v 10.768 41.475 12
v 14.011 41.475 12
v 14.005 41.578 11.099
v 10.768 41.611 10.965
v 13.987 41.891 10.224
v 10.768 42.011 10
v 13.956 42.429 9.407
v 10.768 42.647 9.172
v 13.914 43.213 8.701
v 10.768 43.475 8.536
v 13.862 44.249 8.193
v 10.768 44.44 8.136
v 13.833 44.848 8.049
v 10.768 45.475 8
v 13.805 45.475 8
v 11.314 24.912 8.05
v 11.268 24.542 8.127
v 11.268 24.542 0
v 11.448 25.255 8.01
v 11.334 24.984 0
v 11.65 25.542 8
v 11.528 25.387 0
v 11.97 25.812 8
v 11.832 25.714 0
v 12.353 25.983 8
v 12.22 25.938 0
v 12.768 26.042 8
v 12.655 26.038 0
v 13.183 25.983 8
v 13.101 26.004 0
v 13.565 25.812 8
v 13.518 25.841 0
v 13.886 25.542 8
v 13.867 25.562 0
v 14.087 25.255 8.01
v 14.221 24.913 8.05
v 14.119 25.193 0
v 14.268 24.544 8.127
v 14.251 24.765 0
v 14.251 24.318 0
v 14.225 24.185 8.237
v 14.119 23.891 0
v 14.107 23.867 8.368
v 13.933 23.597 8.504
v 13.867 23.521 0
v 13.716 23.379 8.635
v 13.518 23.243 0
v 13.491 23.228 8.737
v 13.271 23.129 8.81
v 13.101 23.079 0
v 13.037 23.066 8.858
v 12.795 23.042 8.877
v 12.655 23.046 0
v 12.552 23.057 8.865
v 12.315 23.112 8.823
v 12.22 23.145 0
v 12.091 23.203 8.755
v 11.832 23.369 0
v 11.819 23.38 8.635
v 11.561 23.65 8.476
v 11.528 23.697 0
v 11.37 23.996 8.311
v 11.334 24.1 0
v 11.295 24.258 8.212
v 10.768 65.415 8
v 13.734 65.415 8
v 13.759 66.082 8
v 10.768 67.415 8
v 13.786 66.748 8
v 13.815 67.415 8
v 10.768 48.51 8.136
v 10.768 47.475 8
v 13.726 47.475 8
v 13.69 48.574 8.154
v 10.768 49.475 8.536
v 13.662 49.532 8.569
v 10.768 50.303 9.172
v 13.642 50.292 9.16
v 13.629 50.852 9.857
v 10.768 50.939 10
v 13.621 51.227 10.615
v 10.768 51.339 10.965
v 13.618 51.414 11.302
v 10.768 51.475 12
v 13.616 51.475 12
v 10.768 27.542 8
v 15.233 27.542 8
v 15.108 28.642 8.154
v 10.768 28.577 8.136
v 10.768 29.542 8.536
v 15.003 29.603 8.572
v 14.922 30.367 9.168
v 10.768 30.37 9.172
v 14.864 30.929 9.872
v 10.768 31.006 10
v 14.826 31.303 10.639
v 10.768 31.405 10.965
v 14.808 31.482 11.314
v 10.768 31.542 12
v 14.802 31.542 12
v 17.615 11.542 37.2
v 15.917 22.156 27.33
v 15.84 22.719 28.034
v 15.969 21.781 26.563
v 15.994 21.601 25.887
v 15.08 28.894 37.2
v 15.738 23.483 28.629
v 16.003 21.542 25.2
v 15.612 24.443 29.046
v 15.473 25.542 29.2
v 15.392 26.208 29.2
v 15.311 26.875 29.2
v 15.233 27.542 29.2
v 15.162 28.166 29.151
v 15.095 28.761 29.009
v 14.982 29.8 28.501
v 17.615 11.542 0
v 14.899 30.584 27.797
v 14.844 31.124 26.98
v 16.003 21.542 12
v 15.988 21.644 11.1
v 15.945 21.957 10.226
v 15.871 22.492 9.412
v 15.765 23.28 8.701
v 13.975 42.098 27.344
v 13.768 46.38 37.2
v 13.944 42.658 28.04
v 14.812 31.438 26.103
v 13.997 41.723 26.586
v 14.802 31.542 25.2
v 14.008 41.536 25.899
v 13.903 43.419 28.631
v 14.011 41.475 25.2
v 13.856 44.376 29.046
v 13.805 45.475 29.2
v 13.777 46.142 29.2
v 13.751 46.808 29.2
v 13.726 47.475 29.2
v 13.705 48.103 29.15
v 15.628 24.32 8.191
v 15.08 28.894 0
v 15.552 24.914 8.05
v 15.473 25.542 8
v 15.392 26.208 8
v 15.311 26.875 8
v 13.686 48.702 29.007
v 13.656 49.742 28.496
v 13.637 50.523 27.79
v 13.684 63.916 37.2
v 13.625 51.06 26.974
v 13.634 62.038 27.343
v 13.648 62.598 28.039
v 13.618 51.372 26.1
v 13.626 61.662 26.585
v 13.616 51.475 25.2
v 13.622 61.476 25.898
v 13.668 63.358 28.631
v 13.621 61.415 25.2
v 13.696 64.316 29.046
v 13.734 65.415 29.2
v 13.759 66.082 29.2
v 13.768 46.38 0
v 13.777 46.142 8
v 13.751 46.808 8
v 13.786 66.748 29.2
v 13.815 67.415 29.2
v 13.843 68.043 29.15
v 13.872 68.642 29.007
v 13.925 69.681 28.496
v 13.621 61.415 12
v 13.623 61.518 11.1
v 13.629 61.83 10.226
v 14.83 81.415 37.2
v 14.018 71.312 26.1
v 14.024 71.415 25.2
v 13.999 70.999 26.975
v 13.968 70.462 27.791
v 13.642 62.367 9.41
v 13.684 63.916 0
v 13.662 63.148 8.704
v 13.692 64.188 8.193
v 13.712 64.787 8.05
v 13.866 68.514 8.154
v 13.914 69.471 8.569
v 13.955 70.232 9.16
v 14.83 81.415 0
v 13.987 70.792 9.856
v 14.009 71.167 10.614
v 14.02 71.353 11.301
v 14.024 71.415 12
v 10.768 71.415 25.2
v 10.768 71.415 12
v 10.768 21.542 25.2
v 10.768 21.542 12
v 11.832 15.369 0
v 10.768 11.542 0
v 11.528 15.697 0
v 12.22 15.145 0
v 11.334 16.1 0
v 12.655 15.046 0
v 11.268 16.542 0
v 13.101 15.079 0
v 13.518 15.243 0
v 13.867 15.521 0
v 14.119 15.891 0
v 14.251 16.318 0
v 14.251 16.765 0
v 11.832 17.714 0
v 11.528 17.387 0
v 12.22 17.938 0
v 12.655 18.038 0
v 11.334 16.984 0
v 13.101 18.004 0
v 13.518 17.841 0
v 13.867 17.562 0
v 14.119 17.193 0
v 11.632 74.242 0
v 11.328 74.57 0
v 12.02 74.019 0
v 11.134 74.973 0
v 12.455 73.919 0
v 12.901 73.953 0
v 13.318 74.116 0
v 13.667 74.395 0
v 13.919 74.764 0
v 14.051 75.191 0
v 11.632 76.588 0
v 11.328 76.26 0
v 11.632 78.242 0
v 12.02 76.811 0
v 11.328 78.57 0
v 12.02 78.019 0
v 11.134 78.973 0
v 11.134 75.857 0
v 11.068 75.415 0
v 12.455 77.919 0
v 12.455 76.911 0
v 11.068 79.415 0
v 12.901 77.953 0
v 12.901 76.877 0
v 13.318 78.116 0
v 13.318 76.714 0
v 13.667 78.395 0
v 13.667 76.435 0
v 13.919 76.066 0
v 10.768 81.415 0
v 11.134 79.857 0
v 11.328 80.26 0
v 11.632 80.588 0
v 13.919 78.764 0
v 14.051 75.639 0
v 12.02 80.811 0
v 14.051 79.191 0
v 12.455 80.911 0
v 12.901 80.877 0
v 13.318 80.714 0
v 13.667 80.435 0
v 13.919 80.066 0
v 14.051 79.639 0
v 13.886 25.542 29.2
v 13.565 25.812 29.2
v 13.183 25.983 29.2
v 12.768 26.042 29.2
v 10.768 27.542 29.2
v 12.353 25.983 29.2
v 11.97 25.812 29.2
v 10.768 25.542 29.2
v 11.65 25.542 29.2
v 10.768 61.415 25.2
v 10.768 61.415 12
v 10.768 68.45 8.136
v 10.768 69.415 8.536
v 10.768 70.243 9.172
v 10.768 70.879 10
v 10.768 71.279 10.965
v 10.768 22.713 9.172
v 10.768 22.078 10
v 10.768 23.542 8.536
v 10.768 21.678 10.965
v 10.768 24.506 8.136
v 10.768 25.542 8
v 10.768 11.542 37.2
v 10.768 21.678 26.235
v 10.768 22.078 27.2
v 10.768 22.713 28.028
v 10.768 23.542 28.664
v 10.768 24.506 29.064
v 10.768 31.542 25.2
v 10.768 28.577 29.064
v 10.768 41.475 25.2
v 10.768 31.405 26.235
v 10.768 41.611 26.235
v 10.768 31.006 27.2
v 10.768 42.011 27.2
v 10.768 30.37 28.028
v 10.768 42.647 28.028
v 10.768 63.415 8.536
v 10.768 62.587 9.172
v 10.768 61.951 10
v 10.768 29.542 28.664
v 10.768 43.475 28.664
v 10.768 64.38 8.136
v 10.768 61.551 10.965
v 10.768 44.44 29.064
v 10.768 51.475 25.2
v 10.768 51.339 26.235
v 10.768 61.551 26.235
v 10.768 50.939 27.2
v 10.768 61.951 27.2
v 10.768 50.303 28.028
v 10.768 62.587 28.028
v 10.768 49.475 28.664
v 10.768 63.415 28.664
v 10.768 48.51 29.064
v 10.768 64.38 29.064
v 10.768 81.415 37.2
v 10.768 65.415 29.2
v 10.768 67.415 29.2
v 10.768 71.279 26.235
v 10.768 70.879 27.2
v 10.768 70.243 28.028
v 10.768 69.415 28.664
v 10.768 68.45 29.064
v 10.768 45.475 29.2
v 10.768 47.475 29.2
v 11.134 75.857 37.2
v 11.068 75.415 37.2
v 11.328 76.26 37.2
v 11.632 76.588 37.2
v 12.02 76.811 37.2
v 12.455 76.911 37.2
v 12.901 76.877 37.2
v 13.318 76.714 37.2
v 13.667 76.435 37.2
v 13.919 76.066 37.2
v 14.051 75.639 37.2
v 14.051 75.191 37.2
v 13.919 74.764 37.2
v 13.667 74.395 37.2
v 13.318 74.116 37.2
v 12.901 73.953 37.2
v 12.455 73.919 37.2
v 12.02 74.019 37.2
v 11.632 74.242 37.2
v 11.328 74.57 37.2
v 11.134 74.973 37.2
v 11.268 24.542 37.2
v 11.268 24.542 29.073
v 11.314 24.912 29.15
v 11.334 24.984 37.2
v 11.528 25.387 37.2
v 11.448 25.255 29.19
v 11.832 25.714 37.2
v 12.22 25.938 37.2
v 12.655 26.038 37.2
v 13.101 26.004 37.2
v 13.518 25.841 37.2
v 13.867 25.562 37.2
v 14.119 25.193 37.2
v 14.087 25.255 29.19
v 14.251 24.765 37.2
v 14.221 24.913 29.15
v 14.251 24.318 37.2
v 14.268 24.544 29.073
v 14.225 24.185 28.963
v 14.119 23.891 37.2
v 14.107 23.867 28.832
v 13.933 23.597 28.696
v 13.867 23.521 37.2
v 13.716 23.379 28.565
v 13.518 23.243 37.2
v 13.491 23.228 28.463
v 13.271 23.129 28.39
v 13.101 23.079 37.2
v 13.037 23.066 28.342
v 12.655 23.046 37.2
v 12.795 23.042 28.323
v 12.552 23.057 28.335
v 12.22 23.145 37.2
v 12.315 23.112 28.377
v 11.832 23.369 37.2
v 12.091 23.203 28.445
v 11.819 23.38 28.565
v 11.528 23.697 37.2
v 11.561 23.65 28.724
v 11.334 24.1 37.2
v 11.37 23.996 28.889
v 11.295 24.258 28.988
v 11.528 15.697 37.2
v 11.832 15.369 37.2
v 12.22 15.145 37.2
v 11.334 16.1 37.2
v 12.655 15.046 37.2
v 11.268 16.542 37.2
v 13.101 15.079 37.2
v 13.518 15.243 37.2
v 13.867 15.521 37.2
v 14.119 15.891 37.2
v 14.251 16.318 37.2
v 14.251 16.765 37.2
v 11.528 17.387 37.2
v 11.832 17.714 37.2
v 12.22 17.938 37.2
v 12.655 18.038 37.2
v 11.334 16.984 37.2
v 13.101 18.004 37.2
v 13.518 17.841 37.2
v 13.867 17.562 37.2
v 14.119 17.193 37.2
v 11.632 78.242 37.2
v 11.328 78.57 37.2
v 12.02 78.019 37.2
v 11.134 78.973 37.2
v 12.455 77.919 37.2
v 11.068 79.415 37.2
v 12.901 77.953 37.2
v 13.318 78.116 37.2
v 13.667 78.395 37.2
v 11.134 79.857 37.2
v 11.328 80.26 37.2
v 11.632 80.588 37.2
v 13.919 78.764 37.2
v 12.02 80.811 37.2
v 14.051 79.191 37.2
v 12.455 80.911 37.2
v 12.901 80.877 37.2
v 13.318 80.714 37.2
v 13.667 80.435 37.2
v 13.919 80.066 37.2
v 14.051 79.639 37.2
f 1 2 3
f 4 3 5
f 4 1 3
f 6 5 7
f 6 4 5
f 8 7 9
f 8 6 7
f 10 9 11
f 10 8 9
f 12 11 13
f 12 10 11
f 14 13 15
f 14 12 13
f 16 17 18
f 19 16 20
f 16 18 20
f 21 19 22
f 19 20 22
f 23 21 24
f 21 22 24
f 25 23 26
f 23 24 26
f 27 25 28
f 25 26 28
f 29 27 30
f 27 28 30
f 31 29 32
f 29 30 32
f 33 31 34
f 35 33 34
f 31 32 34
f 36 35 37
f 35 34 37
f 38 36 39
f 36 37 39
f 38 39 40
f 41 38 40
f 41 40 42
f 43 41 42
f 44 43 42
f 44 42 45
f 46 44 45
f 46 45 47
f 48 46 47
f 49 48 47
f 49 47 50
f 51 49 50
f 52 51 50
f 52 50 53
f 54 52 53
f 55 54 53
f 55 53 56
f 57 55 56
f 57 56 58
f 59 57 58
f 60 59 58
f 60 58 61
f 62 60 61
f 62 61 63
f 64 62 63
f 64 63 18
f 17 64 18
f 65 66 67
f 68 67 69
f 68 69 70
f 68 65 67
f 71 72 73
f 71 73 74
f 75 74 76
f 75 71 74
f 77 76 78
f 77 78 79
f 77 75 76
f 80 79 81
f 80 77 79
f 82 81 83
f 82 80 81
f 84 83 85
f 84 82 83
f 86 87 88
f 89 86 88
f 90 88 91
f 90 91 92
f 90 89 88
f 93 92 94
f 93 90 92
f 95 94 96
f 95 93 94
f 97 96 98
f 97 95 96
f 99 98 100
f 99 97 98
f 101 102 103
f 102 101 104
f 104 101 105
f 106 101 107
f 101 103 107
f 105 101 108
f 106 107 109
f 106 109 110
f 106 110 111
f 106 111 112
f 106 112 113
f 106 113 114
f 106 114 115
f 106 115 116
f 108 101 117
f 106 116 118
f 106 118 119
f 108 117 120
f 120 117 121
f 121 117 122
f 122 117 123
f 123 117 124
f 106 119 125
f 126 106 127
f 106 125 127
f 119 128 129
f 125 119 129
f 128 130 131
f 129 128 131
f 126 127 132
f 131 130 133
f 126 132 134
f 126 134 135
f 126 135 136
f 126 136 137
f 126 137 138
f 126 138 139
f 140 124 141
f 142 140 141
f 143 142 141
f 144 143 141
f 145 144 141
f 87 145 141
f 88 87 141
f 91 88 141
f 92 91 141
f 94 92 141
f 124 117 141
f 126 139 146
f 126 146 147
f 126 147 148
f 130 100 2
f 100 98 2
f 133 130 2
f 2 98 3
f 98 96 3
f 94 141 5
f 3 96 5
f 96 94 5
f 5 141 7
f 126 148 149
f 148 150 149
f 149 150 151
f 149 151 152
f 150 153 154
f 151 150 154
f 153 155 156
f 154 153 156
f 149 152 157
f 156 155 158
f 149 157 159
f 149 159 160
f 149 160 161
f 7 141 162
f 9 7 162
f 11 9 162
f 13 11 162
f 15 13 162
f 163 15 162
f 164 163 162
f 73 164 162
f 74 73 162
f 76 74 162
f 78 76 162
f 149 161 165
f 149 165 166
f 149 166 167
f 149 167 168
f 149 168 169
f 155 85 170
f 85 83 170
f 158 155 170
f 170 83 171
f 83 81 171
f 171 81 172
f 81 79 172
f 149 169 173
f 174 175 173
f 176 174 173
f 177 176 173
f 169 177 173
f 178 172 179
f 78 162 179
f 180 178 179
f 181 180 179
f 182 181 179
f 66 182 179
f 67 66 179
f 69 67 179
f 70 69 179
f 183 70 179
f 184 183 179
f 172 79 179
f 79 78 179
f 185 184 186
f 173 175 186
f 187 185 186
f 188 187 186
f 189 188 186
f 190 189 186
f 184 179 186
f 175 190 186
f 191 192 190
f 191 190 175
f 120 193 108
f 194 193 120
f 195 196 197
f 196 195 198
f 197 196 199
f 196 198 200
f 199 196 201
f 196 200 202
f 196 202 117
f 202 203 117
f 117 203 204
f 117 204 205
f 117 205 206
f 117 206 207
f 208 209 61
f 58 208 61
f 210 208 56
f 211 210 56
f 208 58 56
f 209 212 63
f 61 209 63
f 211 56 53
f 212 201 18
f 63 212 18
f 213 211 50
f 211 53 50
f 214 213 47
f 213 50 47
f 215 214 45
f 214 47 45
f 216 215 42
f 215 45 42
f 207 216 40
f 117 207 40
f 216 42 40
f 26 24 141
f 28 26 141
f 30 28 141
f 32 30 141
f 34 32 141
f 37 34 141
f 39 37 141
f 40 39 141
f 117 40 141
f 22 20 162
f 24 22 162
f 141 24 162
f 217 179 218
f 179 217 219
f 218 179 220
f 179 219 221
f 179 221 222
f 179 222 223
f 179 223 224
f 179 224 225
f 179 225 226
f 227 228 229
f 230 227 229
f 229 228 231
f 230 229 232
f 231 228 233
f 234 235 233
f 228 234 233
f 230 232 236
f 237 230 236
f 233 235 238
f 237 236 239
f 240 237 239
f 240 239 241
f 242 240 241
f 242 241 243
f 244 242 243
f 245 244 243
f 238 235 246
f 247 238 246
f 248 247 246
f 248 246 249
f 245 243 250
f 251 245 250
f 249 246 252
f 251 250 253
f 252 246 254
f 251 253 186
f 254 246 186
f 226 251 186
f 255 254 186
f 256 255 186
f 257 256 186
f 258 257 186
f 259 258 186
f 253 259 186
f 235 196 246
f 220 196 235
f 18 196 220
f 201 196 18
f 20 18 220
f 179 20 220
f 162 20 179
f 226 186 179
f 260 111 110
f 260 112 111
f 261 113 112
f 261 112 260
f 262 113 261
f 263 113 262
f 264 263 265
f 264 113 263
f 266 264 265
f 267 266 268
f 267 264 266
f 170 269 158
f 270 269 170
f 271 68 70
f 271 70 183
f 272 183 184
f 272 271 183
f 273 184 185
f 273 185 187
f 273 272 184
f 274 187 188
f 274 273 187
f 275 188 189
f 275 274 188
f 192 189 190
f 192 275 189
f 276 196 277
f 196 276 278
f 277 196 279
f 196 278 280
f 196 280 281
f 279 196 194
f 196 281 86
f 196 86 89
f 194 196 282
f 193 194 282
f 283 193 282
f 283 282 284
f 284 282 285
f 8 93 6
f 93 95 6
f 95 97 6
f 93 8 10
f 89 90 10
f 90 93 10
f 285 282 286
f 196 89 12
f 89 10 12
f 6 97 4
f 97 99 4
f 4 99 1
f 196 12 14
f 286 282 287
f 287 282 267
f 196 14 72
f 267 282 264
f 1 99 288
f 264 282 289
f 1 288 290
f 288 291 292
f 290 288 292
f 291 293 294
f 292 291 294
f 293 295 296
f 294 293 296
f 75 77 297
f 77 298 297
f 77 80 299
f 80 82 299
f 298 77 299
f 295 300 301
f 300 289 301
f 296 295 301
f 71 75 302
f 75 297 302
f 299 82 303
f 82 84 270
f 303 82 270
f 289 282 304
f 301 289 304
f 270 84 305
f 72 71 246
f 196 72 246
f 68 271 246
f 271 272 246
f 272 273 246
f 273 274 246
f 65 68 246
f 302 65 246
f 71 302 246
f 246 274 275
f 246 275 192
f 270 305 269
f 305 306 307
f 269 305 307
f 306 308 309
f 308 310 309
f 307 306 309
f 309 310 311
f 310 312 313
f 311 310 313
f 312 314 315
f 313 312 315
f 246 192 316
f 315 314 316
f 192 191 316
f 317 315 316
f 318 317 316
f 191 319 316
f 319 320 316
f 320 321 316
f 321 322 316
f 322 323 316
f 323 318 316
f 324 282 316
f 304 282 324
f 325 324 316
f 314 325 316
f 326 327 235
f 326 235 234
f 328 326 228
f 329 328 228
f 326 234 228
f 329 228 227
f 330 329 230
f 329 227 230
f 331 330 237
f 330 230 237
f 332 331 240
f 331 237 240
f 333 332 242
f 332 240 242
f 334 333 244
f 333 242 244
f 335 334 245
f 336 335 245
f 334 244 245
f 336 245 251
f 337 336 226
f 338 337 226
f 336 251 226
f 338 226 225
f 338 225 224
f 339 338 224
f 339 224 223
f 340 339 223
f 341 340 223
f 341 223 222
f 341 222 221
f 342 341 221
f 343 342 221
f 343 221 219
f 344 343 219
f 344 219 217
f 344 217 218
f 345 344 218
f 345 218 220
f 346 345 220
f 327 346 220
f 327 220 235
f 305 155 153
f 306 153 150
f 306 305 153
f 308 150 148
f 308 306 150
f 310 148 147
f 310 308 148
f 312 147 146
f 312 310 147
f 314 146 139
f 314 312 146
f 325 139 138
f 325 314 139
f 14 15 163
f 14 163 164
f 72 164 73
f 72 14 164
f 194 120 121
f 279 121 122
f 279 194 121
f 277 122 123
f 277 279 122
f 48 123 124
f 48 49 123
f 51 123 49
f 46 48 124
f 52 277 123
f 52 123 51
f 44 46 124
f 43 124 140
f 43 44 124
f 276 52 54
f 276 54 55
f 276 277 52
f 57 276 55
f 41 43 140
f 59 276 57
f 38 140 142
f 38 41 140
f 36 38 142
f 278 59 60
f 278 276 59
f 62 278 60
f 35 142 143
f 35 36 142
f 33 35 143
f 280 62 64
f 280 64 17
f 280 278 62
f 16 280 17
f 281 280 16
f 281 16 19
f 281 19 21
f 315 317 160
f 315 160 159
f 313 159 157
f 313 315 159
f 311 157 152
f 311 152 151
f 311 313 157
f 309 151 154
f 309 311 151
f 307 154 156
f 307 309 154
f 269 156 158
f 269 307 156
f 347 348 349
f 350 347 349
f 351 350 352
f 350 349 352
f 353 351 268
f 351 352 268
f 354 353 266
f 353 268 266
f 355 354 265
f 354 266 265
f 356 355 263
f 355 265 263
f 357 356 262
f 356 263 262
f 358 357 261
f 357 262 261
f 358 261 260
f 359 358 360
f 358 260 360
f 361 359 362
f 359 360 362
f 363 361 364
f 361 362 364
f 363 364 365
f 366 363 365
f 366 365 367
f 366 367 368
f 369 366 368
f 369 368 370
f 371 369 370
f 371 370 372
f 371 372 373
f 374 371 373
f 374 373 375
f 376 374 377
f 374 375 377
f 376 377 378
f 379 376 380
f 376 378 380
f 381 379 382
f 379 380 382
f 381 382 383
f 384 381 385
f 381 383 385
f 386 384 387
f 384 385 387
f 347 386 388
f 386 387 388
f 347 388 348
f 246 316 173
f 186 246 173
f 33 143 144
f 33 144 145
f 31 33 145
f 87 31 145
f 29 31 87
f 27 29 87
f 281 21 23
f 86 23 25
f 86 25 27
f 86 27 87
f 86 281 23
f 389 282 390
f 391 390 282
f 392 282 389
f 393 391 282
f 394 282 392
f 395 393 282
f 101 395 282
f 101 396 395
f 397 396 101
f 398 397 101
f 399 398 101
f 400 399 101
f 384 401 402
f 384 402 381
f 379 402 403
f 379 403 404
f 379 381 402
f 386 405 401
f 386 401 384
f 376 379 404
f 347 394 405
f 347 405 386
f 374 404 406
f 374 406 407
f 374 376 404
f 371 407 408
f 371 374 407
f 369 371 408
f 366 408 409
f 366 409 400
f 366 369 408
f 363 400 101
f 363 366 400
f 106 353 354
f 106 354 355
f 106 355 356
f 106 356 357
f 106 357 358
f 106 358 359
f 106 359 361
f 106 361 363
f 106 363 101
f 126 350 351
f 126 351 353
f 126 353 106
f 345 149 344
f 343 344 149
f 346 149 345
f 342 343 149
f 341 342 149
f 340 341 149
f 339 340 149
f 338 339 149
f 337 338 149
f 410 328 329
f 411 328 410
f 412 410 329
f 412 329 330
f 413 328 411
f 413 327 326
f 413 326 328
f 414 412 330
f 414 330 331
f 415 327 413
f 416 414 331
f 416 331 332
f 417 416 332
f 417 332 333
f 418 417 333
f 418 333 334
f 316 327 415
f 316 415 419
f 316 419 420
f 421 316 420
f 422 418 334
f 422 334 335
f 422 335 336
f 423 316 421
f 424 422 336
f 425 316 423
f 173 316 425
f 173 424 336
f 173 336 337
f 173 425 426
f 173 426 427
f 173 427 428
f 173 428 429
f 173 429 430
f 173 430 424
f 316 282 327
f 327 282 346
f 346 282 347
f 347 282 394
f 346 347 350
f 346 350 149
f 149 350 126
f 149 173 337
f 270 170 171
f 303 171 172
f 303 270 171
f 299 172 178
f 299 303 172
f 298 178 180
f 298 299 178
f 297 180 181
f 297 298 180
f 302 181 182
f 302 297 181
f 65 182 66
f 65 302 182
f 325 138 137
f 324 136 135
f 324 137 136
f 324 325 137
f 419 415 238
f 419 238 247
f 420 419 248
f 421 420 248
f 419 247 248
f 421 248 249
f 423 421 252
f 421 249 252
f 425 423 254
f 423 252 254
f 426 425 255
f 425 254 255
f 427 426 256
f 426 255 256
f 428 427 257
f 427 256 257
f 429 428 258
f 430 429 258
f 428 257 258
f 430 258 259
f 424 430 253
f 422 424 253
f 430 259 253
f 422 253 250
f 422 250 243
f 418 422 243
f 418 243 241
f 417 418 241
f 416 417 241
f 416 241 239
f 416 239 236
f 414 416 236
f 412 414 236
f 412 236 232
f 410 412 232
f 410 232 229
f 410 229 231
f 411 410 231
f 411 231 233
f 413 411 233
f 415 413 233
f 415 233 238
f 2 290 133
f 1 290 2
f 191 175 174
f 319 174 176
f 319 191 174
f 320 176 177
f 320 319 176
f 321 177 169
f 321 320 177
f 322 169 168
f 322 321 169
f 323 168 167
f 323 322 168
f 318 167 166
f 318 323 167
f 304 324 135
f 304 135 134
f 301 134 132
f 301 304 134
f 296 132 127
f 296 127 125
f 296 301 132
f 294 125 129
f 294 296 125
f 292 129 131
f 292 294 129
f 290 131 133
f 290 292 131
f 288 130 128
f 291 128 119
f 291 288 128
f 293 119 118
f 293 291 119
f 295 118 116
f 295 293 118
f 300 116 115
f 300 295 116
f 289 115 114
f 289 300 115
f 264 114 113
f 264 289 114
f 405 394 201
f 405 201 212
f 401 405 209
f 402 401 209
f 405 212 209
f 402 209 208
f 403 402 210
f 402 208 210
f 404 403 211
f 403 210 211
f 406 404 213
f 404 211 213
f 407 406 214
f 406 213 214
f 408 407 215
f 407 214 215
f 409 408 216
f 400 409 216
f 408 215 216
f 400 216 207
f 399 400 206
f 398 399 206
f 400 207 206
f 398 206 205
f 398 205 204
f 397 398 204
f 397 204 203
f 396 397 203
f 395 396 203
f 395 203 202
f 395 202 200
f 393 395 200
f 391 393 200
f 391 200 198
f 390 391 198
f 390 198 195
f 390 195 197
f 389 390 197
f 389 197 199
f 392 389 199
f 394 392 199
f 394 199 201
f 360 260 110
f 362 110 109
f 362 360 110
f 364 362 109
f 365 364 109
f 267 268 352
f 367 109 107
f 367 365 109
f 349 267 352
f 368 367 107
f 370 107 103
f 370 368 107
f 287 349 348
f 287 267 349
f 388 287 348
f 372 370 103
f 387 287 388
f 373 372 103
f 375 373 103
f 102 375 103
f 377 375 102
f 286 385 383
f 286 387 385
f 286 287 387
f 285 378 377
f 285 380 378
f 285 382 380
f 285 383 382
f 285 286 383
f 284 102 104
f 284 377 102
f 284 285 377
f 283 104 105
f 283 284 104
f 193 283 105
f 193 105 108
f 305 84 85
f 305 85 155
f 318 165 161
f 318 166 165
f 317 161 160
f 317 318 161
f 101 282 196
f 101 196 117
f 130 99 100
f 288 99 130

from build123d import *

# Parameters (mm, degrees)
RESSALTO_EXTRUS_O1_DEPTH = 37.2
FILETE3_R                = 10
FILETE4_R                = 10
ESBO_O3_W                = 64.493903811
ESBO_O3_H                = 22.028162523
CORTE_EXTRUS_O2_DEPTH    = 126.622328301
ESBO_O4_W                = 56.697594262
ESBO_O4_H                = 123.119514717
CORTE_EXTRUS_O6_DEPTH    = 126.622328159
ESBO_O7_W                = 25.761955102
ESBO_O7_H                = 34.830585193
CORTE_EXTRUS_O7_DEPTH    = 125.245881598
CORTE_EXTRUS_O8_DEPTH    = 90.772656751
ESBO_O9_R                = 1.5
CORTE_EXTRUS_O9_DEPTH    = 92.227960203


with BuildPart() as part:
    # Esboço1 → Ressalto-extrusão1 (new body)
    with BuildSketch(Plane.XY):
        with BuildLine():
            ThreePointArc((-10, 0), (0, -10), (10, 0))
            Line((10, 0), (20, 0))
            ThreePointArc((20, 0), (14.071698091, 40.495175194), (14.829943665, 81.414963086))
            ThreePointArc((14.829943665, 81.414963086), (11.193742071, 116.066691762), (-16.576524471, 95.024435265))
            Line((-16.576524471, 95.024435265), (-16.487894969, 94.437265709))
            Line((-16.487894969, 94.437265709), (-16.369382775, 93.652123615))
            ThreePointArc((-16.369382775, 93.652123615), (-13.756795166, 46.654405302), (-20, 0))
            Line((-20, 0), (-10, 0))
        make_face()
    extrude(amount=RESSALTO_EXTRUS_O1_DEPTH)

    # Filete3
    # the kernel refuses this fillet: 10 mm, written as the material it takes off along each edge
    with BuildSketch(Plane(origin=(20, 0, -29.463728433), x_dir=(-0.20232831186330175, 0.9793177493635794, 0), z_dir=(0, 0, 1))) as filete3_piece_1:
        with BuildLine():
            CenterArc((12.021201201, 9.997221658), FILETE3_R, 181.169168083, 87.480189)
            Line((2.023283119, 9.793177494), (1.823324757, 9.78909661))
            ThreePointArc((1.823324757, 9.78909661), (0.815778009, 4.937054409), (-0.19586355, 0.040465662))
            Line((-0.19586355, 0.040465662), (0.004714197, -0.199944433))
            ThreePointArc((0.004714197, -0.199944433), (5.892745687, -0.130541448), (11.780777177, -0.199944433))
            Line((11.780777177, -0.199944433), (11.785491373, 0))
        make_face()
    extrude(amount=96.127456867, mode=Mode.SUBTRACT)
    with BuildSketch(Plane(origin=(-20, 0, -29.463728433), x_dir=(1, 0, 0), z_dir=(0, 0, 1))) as filete3_piece_2:
        with BuildLine():
            CenterArc((12.222685959, 9.749854723), FILETE3_R, 169.67749742, 87.480189)
            Line((2.384538574, 11.541740887), (2.187775626, 11.57757861))
            ThreePointArc((2.187775626, 11.57757861), (1.06442773, 5.797282674), (-0.194855317, 0.045071116))
            Line((-0.194855317, 0.045071116), (0, -0.2))
            ThreePointArc((0, -0.2), (5, -0.2), (9.955546281, -0.194997094))
            Line((9.955546281, -0.194997094), (10, 0))
        make_face()
    extrude(amount=96.127456867, mode=Mode.SUBTRACT)

    # Filete4
    filete4_edges = [part.edges().sort_by_distance(p)[0] for p in [
        (10, 0, 18.6),
        (-10, 0, 18.6),
    ]]
    fillet(filete4_edges, radius=FILETE4_R)

    # Esboço3 → Corte-extrusão2 (cut, through all)
    with BuildSketch(Plane.XY.offset(37.2)):
        with Locations((-2.119172362, 0.527659626)):
            Rectangle(ESBO_O3_W, ESBO_O3_H)
    extrude(amount=-CORTE_EXTRUS_O2_DEPTH, mode=Mode.SUBTRACT)

    # Esboço4 → Corte-extrusão6 (cut, through all)
    with BuildSketch(Plane.XY.offset(37.2)):
        with Locations((-17.581232159, 73.101498246)):
            Rectangle(ESBO_O4_W, ESBO_O4_H)
    extrude(amount=-CORTE_EXTRUS_O6_DEPTH, mode=Mode.SUBTRACT)

    # Esboço7 → Corte-extrusão7 (cut, through all)
    with BuildSketch(Plane.XY.offset(37.2)):
        with Locations((23.648542523, 98.830255682)):
            Rectangle(ESBO_O7_W, ESBO_O7_H)
    extrude(amount=-CORTE_EXTRUS_O7_DEPTH, mode=Mode.SUBTRACT)

    # Esboço8 → Corte-extrusão8 (cut, through all)
    with BuildSketch(Plane.ZY.offset(-10.767564972)):
        with BuildLine():
            Line((12, 71.414963086), (25.2, 71.414963086))
            ThreePointArc((25.2, 71.414963086), (28.028427125, 70.243390211), (29.2, 67.414963086))
            Line((29.2, 67.414963086), (29.2, 65.414963086))
            ThreePointArc((29.2, 65.414963086), (28.028427125, 62.586535961), (25.2, 61.414963086))
            Line((25.2, 61.414963086), (12, 61.414963086))
            ThreePointArc((12, 61.414963086), (9.171572875, 62.586535961), (8, 65.414963086))
            Line((8, 65.414963086), (8, 67.414963086))
            ThreePointArc((8, 67.414963086), (9.171572875, 70.243390211), (12, 71.414963086))
        make_face()
        with BuildLine():
            Line((12, 51.474963086), (25.2, 51.474963086))
            ThreePointArc((25.2, 51.474963086), (28.028427125, 50.303390211), (29.2, 47.474963086))
            Line((29.2, 47.474963086), (29.2, 45.474963086))
            ThreePointArc((29.2, 45.474963086), (28.028427125, 42.646535961), (25.2, 41.474963086))
            Line((25.2, 41.474963086), (12, 41.474963086))
            ThreePointArc((12, 41.474963086), (9.171572875, 42.646535961), (8, 45.474963086))
            Line((8, 45.474963086), (8, 47.474963086))
            ThreePointArc((8, 47.474963086), (9.171572875, 50.303390211), (12, 51.474963086))
        make_face()
        with BuildLine():
            Line((12, 31.541740887), (25.2, 31.541740887))
            ThreePointArc((25.2, 31.541740887), (28.028427125, 30.370168012), (29.2, 27.541740887))
            Line((29.2, 27.541740887), (29.2, 25.541740887))
            ThreePointArc((29.2, 25.541740887), (28.028427125, 22.713313762), (25.2, 21.541740887))
            Line((25.2, 21.541740887), (12, 21.541740887))
            ThreePointArc((12, 21.541740887), (9.171572875, 22.713313762), (8, 25.541740887))
            Line((8, 25.541740887), (8, 27.541740887))
            ThreePointArc((8, 27.541740887), (9.171572875, 30.370168012), (12, 31.541740887))
        make_face()
    extrude(amount=-CORTE_EXTRUS_O8_DEPTH, mode=Mode.SUBTRACT)

    # Esboço9 → Corte-extrusão9 (cut, through all)
    with BuildSketch(Plane(origin=(0, 0, 0), x_dir=(-1, 0, 0), z_dir=(0, 0, -1))):
        with Locations((-12.767564972, 16.541740887)):
            Circle(ESBO_O9_R)
        with Locations((-12.767564972, 24.541740887)):
            Circle(ESBO_O9_R)
        with Locations((-12.567564972, 79.414963086)):
            Circle(ESBO_O9_R)
        with Locations((-12.567564972, 75.414963086)):
            Circle(ESBO_O9_R)
    extrude(amount=-CORTE_EXTRUS_O9_DEPTH, mode=Mode.SUBTRACT)


solid = part.part
